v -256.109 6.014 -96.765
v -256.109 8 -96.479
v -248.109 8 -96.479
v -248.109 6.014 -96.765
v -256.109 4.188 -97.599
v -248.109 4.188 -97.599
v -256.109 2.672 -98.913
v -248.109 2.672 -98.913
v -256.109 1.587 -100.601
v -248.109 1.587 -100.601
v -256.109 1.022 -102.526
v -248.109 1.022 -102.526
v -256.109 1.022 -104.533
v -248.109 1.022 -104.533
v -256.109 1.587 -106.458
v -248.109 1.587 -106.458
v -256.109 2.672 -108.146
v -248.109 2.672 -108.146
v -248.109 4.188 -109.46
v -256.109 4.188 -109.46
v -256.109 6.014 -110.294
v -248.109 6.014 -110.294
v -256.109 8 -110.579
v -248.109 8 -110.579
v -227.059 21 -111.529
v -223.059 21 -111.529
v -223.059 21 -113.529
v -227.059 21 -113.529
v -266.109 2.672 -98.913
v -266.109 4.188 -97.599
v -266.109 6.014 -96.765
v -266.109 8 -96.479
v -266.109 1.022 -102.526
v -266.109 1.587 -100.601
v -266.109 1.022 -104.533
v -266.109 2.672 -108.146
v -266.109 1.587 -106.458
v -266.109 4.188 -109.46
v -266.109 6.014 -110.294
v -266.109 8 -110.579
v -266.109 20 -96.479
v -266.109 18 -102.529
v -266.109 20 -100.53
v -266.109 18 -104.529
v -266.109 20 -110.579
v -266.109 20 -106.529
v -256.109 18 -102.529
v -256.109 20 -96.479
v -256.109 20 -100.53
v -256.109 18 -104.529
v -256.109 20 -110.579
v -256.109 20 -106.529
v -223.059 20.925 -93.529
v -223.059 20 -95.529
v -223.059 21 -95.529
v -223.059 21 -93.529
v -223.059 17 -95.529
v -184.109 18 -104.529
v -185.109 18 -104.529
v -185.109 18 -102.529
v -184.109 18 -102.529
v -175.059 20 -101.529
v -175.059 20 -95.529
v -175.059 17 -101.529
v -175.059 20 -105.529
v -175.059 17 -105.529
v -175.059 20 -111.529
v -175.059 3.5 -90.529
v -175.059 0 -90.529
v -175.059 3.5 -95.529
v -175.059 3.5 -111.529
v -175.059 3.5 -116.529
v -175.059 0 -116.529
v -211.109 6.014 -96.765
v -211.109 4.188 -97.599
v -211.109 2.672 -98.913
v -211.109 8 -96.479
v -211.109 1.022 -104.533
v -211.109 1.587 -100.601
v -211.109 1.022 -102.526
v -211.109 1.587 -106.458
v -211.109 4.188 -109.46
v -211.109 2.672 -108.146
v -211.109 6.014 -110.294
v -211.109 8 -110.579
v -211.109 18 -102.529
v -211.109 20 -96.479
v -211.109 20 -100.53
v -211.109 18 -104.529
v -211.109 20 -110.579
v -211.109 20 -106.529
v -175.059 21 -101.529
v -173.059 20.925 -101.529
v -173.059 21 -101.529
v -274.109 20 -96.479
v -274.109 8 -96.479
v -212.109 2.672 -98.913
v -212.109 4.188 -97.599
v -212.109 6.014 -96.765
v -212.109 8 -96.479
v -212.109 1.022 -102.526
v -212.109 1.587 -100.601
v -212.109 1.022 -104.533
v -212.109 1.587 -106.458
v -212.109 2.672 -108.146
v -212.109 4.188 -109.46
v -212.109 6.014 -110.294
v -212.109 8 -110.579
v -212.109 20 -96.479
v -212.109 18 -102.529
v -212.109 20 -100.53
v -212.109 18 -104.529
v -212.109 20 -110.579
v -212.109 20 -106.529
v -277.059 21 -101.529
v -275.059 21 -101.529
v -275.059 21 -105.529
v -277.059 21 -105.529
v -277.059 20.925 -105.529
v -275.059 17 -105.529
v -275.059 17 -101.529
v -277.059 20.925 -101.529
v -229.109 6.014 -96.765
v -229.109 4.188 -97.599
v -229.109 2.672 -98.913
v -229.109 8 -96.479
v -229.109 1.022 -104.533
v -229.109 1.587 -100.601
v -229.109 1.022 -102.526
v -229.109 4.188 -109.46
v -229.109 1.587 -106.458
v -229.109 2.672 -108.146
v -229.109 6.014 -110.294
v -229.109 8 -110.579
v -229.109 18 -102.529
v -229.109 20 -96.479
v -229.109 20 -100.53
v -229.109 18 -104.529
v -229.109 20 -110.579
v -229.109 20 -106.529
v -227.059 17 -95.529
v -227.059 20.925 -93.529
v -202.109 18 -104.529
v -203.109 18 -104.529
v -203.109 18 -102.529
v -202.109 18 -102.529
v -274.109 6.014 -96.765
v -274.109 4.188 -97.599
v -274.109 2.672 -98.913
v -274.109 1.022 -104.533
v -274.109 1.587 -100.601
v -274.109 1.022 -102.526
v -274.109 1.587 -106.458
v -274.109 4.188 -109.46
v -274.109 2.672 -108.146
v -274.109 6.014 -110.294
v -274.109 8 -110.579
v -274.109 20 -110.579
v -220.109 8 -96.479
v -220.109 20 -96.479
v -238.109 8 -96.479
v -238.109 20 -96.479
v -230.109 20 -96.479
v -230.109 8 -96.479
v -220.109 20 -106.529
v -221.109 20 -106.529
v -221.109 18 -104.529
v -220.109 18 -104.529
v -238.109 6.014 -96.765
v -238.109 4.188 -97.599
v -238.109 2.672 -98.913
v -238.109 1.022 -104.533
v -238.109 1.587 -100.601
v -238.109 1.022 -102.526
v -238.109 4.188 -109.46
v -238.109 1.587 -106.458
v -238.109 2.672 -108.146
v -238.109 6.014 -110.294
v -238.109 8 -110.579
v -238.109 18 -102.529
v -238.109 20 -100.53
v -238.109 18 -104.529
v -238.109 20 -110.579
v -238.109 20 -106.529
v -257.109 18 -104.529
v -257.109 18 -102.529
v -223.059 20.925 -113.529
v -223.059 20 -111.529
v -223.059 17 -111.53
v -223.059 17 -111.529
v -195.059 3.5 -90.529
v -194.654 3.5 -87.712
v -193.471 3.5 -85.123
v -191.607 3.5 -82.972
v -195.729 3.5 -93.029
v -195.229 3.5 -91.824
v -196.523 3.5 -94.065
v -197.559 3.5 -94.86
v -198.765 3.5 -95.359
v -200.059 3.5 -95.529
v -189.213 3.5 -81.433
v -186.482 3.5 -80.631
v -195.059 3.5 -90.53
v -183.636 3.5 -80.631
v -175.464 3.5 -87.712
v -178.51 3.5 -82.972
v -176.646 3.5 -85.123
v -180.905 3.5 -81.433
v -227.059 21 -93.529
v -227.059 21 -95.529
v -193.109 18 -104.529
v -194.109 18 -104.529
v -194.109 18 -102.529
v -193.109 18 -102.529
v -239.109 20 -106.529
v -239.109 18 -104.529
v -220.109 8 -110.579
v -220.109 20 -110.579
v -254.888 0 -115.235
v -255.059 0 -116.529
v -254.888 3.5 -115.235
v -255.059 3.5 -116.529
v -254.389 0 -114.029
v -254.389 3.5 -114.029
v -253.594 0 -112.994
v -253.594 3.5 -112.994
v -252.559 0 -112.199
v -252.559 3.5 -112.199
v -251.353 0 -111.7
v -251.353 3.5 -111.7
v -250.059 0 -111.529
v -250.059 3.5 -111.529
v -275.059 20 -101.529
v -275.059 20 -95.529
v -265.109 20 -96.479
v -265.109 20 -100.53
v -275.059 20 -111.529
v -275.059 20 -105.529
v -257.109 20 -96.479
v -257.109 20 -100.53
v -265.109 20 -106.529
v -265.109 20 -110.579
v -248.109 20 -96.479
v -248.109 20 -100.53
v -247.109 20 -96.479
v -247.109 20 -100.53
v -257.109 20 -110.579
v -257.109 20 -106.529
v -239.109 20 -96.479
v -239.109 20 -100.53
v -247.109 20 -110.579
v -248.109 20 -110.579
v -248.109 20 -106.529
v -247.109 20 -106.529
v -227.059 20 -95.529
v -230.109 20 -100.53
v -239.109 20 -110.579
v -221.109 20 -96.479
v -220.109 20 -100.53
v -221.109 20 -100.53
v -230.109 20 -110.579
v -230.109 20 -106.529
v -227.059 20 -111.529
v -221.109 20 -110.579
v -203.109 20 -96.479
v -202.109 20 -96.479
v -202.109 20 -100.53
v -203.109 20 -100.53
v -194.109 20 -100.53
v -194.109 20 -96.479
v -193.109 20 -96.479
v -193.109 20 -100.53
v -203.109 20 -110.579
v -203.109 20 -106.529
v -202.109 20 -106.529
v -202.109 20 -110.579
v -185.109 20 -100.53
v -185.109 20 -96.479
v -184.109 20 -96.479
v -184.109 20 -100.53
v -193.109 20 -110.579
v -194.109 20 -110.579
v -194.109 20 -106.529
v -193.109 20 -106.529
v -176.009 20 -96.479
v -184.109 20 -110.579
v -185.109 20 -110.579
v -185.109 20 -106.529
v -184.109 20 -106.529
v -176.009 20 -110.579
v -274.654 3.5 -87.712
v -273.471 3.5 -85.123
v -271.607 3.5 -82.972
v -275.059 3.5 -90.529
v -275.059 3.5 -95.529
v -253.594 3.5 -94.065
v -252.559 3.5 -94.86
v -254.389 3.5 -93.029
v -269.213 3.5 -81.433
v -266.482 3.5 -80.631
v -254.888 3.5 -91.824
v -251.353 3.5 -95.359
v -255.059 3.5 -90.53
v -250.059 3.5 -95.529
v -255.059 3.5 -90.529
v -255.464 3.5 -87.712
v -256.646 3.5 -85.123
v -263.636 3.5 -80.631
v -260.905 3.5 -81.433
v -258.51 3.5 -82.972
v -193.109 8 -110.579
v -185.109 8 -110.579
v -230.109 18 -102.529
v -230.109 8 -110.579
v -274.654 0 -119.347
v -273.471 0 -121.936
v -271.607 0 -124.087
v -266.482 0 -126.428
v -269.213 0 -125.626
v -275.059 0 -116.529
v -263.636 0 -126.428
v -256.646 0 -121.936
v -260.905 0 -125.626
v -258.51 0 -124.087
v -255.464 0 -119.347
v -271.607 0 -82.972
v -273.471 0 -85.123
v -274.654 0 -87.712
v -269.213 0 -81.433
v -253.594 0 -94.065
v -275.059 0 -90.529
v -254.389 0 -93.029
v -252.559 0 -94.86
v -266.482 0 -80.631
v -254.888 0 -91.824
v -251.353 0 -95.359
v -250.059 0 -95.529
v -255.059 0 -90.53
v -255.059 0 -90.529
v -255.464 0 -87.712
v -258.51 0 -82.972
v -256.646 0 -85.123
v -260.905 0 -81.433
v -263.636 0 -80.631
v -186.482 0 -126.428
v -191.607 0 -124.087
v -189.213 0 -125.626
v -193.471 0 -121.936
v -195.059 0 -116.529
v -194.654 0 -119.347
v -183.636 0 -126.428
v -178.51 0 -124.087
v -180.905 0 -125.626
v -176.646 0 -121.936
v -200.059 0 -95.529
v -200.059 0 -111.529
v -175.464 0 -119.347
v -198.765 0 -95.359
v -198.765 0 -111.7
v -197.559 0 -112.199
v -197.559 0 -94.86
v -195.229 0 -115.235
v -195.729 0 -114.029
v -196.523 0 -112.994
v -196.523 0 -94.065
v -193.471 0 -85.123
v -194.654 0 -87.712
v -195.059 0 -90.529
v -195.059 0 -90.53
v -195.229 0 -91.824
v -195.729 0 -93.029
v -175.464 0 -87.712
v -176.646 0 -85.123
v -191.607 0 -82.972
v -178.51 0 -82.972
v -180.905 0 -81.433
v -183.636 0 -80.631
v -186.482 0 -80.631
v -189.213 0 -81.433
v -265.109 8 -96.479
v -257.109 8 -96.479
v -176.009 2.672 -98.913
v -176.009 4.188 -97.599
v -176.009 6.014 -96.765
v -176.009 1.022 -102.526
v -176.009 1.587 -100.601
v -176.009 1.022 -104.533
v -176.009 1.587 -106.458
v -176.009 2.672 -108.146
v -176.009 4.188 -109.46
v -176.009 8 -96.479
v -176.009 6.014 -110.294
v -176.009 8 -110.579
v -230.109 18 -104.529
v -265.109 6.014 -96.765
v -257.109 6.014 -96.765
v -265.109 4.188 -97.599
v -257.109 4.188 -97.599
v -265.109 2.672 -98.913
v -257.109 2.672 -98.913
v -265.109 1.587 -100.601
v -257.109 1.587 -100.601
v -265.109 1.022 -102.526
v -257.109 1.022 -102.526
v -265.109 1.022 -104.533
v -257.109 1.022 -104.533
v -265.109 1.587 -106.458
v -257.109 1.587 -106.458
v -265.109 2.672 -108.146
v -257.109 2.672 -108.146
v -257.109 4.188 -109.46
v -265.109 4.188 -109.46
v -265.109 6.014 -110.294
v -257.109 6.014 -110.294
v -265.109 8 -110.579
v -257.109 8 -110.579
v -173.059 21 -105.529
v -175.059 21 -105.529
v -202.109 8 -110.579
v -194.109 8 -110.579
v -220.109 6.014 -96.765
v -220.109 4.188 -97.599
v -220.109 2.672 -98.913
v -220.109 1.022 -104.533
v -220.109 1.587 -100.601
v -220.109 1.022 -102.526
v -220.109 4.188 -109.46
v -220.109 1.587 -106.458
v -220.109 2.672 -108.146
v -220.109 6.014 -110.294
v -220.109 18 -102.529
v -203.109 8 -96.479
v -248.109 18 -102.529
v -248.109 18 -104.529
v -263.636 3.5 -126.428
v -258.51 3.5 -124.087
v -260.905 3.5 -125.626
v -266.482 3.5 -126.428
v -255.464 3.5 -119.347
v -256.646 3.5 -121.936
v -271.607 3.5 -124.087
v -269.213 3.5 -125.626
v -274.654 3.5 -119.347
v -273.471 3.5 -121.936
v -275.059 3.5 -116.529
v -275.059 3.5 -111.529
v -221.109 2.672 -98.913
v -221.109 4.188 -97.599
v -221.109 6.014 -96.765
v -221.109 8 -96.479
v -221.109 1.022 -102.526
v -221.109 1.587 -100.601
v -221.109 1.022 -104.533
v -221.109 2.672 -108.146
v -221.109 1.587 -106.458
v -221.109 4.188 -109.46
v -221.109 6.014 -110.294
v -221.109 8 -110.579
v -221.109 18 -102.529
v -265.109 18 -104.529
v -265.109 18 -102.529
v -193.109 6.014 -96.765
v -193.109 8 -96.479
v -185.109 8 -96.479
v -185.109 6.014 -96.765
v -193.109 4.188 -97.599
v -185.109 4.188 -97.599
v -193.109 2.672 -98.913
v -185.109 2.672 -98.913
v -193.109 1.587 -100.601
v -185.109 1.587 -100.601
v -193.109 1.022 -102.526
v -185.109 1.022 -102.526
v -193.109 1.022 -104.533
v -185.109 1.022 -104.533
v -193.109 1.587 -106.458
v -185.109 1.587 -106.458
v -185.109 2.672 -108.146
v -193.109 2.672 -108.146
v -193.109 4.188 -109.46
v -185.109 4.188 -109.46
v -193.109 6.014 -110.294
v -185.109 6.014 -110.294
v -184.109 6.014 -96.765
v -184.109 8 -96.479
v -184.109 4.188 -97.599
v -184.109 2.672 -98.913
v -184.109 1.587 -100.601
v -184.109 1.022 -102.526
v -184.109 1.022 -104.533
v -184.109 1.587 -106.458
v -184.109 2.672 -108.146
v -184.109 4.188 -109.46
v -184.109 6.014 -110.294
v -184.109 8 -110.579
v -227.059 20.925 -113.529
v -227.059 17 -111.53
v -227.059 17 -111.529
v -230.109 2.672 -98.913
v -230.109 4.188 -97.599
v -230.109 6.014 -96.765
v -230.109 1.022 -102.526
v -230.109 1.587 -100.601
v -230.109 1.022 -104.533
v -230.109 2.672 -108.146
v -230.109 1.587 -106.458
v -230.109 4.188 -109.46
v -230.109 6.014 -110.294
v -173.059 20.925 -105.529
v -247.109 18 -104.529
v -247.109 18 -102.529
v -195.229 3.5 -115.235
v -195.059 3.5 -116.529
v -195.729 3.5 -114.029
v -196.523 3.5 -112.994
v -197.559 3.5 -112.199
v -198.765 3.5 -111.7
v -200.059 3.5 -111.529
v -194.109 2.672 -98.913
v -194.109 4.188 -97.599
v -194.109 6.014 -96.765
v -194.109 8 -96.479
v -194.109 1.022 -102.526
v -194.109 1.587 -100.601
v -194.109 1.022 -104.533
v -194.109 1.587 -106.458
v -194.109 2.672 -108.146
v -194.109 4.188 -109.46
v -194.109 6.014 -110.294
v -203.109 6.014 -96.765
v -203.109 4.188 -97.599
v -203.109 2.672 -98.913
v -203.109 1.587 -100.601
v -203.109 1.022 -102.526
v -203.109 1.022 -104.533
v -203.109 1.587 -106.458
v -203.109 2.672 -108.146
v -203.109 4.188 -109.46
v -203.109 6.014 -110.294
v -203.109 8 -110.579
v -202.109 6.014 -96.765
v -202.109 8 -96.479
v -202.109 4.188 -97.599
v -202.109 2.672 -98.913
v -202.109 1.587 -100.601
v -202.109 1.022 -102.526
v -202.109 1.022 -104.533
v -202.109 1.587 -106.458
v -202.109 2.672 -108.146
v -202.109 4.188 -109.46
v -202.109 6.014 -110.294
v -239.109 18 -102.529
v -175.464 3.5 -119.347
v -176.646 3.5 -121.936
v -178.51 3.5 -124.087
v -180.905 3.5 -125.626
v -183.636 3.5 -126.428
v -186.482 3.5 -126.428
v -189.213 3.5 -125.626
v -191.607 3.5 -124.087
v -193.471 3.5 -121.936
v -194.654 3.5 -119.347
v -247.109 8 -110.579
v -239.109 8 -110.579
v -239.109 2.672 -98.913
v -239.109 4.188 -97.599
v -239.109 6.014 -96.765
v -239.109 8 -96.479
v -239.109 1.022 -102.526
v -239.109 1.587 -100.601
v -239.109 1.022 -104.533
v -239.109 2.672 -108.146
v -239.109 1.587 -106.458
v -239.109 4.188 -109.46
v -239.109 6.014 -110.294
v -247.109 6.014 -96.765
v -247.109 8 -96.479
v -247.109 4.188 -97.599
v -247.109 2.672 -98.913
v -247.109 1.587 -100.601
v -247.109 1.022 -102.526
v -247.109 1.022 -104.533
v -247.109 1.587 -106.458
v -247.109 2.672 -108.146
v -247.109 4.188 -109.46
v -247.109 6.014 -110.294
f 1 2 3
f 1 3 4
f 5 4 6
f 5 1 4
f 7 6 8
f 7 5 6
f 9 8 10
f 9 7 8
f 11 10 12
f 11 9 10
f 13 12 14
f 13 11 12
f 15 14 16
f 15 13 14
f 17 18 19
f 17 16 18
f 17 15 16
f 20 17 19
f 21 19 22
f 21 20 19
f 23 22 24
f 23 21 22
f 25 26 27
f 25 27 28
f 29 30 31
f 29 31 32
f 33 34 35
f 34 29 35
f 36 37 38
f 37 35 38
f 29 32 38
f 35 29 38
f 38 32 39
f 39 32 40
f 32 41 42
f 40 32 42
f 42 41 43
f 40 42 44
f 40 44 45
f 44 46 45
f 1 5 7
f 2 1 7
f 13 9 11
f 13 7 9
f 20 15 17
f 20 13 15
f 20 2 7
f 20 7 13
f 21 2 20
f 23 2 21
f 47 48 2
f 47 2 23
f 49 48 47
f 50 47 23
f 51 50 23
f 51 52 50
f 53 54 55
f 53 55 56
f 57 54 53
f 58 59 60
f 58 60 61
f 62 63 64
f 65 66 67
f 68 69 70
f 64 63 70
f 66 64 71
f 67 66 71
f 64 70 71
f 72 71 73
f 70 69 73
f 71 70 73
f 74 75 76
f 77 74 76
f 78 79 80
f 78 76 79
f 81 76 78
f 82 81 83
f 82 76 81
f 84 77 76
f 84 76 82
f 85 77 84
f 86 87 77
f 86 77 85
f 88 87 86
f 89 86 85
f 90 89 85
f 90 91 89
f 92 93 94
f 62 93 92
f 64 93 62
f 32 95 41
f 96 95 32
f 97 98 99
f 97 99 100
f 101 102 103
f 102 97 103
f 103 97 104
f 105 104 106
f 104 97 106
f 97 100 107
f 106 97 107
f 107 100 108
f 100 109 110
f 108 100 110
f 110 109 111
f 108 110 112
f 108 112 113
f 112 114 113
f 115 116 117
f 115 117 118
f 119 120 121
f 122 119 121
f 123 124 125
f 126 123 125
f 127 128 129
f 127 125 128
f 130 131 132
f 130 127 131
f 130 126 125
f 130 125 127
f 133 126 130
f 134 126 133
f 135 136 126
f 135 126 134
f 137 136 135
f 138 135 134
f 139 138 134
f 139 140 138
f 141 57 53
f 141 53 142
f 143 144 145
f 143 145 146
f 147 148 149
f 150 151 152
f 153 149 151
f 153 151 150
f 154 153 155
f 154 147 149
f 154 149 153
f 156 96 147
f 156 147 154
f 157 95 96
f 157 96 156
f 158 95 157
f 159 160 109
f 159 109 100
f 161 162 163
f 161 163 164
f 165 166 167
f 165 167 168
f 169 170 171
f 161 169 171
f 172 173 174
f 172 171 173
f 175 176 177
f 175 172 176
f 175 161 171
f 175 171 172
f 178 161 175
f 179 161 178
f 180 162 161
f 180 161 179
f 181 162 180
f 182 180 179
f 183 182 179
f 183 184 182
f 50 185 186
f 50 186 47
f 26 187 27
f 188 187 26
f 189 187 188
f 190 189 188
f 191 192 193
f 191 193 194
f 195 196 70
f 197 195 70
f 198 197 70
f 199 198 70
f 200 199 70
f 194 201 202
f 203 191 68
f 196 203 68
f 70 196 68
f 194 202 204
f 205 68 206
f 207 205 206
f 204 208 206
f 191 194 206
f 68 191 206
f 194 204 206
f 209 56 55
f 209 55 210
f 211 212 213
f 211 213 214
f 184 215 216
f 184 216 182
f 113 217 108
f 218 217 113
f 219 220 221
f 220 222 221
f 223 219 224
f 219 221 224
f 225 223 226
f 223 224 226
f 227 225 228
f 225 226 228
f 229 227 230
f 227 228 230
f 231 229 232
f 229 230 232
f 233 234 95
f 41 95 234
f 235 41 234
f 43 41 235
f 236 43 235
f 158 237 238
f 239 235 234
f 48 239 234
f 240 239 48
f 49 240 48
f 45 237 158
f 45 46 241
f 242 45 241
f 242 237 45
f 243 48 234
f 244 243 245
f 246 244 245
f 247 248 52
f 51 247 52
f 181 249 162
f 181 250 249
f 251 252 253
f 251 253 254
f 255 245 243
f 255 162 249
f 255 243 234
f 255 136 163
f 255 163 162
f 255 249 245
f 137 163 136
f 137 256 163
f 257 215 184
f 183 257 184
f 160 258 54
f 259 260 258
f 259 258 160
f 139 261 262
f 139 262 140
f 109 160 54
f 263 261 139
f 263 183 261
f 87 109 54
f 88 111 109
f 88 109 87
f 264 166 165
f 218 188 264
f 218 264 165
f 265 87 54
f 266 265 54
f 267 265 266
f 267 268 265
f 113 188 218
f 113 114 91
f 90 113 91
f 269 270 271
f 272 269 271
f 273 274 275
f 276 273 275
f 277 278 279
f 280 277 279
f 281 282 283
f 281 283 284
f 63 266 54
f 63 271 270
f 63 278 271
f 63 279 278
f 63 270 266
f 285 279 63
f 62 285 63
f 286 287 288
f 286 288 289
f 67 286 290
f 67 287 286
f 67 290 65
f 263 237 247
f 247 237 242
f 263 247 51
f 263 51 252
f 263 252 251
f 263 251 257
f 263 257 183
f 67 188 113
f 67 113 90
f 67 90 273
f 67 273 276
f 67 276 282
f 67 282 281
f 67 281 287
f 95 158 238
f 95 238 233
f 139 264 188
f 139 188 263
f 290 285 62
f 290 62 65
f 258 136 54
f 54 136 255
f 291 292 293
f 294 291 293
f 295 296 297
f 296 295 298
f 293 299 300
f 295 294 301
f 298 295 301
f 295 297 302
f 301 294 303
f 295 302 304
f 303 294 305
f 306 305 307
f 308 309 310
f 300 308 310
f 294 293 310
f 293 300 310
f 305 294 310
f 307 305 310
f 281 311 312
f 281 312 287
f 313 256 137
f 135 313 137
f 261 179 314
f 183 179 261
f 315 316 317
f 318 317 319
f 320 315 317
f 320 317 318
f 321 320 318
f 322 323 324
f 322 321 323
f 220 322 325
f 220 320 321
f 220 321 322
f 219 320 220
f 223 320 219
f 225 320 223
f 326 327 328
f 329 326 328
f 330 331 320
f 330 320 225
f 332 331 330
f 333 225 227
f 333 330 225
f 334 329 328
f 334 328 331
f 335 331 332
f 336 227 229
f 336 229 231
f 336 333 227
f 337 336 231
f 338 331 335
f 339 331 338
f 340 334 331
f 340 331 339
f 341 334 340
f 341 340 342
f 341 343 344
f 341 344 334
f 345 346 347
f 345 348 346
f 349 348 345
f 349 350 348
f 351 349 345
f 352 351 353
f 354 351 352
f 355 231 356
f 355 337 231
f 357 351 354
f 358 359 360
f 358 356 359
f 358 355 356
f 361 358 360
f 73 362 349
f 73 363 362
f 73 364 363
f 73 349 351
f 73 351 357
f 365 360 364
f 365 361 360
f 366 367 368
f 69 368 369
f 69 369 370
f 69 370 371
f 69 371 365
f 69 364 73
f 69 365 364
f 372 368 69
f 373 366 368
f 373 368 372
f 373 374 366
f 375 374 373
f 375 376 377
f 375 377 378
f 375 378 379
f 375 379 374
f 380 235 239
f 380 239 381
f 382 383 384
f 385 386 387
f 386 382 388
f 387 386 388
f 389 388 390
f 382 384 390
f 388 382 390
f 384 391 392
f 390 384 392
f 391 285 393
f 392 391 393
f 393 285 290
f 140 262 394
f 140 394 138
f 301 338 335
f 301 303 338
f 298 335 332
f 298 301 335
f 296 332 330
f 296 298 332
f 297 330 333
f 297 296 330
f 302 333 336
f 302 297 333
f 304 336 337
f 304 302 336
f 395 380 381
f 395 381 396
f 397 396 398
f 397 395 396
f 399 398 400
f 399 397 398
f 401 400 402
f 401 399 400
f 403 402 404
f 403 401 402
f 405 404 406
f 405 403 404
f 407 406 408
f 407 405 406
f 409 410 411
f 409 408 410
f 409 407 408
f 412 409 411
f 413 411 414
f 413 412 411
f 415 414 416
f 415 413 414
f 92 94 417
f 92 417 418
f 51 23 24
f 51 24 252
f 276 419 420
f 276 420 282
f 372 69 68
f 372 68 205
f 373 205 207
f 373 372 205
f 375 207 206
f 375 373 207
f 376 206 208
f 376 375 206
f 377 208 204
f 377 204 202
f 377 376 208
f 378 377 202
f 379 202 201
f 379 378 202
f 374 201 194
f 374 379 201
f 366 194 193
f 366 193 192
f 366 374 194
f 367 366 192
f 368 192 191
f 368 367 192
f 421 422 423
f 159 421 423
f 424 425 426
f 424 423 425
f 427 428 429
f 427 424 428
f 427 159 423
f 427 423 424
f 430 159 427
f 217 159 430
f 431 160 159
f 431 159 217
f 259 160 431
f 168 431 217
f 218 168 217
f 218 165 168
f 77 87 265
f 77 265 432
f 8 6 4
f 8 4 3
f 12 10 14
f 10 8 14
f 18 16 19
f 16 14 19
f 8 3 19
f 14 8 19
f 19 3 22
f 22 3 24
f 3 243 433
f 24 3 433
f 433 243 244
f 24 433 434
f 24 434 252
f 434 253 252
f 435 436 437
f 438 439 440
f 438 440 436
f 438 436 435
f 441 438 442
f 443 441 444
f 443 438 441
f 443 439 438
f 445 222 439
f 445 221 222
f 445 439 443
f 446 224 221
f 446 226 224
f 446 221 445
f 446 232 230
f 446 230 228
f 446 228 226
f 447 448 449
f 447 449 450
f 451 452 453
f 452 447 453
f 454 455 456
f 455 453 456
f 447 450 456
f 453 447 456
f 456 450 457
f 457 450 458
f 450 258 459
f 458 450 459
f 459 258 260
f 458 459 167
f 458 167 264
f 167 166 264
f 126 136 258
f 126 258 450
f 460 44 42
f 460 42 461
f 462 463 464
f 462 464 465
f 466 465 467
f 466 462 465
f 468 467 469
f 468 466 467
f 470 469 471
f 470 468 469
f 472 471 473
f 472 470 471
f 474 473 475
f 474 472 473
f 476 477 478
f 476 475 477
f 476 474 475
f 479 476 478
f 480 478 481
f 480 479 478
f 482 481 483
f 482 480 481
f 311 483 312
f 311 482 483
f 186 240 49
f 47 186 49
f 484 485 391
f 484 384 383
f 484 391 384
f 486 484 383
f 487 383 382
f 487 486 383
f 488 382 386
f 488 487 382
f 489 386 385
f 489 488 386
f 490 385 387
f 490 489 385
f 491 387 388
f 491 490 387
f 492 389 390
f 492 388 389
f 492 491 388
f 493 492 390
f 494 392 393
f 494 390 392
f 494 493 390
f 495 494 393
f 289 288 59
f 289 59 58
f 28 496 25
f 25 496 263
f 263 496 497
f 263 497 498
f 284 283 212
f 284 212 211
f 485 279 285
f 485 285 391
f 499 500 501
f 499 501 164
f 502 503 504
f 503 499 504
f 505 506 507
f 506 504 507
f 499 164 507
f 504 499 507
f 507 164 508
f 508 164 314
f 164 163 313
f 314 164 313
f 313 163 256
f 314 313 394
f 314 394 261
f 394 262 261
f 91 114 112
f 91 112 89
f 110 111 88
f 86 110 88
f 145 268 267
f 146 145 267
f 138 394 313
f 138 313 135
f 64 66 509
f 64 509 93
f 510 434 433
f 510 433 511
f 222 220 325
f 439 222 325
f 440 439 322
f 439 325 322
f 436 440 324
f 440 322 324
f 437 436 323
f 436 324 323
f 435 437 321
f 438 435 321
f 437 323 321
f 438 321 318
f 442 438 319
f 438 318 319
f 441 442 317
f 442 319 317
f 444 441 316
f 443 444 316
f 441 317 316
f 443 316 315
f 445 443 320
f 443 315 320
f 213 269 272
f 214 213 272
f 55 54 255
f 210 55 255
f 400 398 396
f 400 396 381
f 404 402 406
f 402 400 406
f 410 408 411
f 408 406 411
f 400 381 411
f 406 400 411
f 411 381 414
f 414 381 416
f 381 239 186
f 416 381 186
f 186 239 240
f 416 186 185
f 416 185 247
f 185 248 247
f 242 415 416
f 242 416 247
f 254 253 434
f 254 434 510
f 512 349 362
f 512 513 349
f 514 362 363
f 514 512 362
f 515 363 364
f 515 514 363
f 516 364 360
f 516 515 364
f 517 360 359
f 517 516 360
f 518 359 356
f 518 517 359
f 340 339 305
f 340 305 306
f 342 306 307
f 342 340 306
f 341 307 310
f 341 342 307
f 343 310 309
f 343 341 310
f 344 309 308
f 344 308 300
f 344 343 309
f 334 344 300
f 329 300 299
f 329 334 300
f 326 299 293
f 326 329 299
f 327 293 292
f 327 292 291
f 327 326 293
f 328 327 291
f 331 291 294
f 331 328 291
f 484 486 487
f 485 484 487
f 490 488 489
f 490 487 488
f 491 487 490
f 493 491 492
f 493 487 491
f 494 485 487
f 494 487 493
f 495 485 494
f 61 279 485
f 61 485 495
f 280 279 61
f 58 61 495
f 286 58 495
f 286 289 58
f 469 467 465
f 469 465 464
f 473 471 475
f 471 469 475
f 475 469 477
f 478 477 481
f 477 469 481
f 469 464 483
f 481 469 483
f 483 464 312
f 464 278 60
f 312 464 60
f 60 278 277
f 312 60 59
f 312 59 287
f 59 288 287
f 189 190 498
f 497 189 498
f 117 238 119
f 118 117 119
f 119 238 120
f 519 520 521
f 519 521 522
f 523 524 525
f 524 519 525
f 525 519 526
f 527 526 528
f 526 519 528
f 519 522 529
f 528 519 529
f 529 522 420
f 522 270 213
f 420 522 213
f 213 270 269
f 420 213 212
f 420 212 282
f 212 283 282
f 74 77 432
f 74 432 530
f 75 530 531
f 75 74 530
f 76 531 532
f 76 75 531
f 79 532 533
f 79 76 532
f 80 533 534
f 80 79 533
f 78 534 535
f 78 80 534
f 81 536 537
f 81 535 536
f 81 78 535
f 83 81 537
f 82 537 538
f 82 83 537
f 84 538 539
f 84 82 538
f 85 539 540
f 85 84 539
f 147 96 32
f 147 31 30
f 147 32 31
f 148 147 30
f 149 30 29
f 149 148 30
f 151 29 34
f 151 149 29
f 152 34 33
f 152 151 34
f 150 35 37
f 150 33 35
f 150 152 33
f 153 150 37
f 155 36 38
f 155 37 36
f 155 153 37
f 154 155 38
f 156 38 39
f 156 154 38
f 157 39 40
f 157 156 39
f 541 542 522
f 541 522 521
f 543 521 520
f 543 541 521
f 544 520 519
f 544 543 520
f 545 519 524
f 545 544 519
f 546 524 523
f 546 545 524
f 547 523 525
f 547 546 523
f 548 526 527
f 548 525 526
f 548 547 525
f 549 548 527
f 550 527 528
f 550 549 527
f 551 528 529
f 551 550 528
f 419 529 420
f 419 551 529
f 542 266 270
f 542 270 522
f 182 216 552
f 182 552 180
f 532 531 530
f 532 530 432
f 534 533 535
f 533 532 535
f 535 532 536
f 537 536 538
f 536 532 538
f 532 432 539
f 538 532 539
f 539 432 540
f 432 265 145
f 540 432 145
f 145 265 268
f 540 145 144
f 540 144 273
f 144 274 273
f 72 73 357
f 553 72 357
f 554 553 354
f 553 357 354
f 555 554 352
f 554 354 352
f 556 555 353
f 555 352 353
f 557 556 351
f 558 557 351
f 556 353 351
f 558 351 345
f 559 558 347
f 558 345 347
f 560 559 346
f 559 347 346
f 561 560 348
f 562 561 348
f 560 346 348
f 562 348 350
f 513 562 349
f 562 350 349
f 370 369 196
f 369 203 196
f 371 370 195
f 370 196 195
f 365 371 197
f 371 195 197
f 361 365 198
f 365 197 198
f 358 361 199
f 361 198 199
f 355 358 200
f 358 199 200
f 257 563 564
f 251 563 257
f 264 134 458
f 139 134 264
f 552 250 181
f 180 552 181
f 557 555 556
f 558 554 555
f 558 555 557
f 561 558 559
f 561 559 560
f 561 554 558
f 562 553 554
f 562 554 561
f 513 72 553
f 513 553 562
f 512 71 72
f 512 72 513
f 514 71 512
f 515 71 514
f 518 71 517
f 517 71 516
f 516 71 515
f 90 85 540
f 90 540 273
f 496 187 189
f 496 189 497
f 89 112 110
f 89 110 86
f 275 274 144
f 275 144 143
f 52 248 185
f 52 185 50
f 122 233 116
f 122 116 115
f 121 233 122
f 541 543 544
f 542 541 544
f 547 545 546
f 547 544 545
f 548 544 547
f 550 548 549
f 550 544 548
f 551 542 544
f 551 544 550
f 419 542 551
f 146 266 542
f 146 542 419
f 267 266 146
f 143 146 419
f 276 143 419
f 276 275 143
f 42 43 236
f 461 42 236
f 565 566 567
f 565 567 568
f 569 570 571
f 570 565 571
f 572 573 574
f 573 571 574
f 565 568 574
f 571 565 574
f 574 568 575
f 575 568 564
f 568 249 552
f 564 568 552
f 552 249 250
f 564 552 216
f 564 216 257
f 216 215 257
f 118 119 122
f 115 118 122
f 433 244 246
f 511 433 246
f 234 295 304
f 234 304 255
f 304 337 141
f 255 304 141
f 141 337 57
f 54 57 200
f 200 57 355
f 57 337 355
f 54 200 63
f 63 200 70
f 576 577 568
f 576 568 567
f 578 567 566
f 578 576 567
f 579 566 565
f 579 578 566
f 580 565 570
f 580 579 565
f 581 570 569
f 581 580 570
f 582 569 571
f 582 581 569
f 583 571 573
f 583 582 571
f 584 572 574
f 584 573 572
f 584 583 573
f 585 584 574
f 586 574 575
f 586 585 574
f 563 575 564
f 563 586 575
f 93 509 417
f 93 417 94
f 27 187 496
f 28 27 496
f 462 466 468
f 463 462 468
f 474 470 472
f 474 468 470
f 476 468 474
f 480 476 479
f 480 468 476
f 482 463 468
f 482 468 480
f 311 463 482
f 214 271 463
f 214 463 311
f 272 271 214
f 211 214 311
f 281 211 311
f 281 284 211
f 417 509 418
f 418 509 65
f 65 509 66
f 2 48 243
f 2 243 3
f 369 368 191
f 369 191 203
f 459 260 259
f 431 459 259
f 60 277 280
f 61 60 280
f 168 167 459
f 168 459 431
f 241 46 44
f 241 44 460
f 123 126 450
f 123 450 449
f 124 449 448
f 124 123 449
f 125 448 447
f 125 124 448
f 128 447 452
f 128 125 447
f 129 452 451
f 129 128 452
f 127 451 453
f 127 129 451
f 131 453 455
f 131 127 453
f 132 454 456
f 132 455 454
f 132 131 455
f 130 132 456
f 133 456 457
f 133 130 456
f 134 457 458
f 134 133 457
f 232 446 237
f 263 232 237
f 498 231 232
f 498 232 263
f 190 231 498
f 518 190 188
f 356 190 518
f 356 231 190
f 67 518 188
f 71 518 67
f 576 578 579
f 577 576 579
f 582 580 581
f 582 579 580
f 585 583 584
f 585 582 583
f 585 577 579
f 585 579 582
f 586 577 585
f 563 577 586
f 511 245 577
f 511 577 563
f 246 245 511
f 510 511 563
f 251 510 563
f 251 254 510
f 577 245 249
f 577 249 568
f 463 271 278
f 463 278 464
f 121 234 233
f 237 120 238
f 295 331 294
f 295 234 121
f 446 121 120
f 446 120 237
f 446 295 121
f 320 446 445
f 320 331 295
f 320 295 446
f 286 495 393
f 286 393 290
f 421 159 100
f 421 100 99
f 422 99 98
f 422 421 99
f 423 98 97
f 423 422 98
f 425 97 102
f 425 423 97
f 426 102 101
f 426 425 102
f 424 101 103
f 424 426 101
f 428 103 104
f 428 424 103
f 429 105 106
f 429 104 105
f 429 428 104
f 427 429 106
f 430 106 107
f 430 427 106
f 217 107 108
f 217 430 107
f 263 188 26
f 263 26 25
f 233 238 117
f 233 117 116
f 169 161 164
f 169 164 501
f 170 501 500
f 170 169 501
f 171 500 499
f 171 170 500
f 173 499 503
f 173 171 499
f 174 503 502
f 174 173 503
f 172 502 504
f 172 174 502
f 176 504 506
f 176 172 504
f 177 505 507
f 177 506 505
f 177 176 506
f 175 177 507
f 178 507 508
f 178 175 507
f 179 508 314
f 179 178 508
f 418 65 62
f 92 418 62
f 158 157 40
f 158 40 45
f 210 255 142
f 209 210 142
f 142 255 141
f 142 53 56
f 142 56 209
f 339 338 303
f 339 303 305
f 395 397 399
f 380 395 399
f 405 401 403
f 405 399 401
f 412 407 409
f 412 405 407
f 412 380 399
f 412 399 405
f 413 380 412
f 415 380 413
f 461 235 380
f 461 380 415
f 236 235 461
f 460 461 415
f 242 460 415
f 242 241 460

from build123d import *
from OCP.BRepFilletAPI import BRepFilletAPI_MakeChamfer

# Parameters (mm, degrees)
SKETCH1_W           = 100
SKETCH1_H           = 16
BOSS_EXTRUDE1_DEPTH = 20
CUT_EXTRUDE2_DEPTH  = 100
SKETCH3_W           = 0.95
SKETCH3_H           = 16
BOSS_EXTRUDE2_DEPTH = 20
SKETCH4_W           = 1
SKETCH4_H           = 14.1
BOSS_EXTRUDE3_DEPTH = 20
SKETCH5_W           = 95
SKETCH5_H           = 2
CUT_EXTRUDE3_DEPTH  = 2
BOSS_EXTRUDE4_DEPTH = 3.5
FILLET1_R           = 5
FILLET2_SIZE        = 2
SKETCH9_W           = 2
SKETCH9_H           = 4
SKETCH9_W_2         = 4
SKETCH9_H_2         = 2
BOSS_EXTRUDE5_DEPTH = 4
CHAMFER1_SIZE       = 2
CHAMFER1_SIZE_2     = 3.925221011


with BuildPart() as part:
    # Sketch1 → Boss-Extrude1 (new body)
    with BuildSketch(Plane(origin=(0, 0, 0), x_dir=(1, 0, 0), z_dir=(0, 1, 0))):
        with Locations((-225.058823529, 103.529411765)):
            Rectangle(SKETCH1_W, SKETCH1_H)
    extrude(amount=BOSS_EXTRUDE1_DEPTH)

    # Sketch2 → Cut-Extrude2 (cut)
    with BuildSketch(Plane.ZY.offset(275.058823529)):
        with BuildLine():
            Line((-110.579411765, 20), (-96.479411765, 20))
            Line((-96.479411765, 20), (-96.479411765, 8))
            ThreePointArc((-96.479411765, 8), (-103.529411765, 0.95), (-110.579411765, 8))
            Line((-110.579411765, 8), (-110.579411765, 20))
        make_face()
    extrude(amount=-CUT_EXTRUDE2_DEPTH, mode=Mode.SUBTRACT)

    # Sketch3 → Boss-Extrude2 (add)
    with BuildSketch(Plane(origin=(0, 20, 0), x_dir=(1, 0, 0), z_dir=(0, 1, 0))):
        with Locations((-175.533823529, 103.529411765)):
            Rectangle(SKETCH3_W, SKETCH3_H)
        with Locations((-274.583823529, 103.529411765)):
            Rectangle(SKETCH3_W, SKETCH3_H)
    extrude(amount=-BOSS_EXTRUDE2_DEPTH)

    # Sketch4 → Boss-Extrude3 (add)
    with BuildSketch(Plane(origin=(0, 20, 0), x_dir=(1, 0, 0), z_dir=(0, 1, 0))):
        with Locations((-265.608823529, 103.529411765)):
            Rectangle(SKETCH4_W, SKETCH4_H)
        with Locations((-256.608823529, 103.529411765)):
            Rectangle(SKETCH4_W, SKETCH4_H)
        with Locations((-247.608823529, 103.529411765)):
            Rectangle(SKETCH4_W, SKETCH4_H)
        with Locations((-238.608823529, 103.529411765)):
            Rectangle(SKETCH4_W, SKETCH4_H)
        with Locations((-229.608823529, 103.529411765)):
            Rectangle(SKETCH4_W, SKETCH4_H)
        with Locations((-220.608823529, 103.529411765)):
            Rectangle(SKETCH4_W, SKETCH4_H)
        with Locations((-211.608823529, 103.529411765)):
            Rectangle(SKETCH4_W, SKETCH4_H)
        with Locations((-202.608823529, 103.529411765)):
            Rectangle(SKETCH4_W, SKETCH4_H)
        with Locations((-193.608823529, 103.529411765)):
            Rectangle(SKETCH4_W, SKETCH4_H)
        with Locations((-184.608823529, 103.529411765)):
            Rectangle(SKETCH4_W, SKETCH4_H)
    extrude(amount=-BOSS_EXTRUDE3_DEPTH)

    # Sketch5 → Cut-Extrude3 (cut)
    with BuildSketch(Plane(origin=(0, 20, 0), x_dir=(1, 0, 0), z_dir=(0, 1, 0))):
        with Locations((-225.058823529, 103.529411765)):
            Rectangle(SKETCH5_W, SKETCH5_H)
    extrude(amount=-CUT_EXTRUDE3_DEPTH, mode=Mode.SUBTRACT)

    # Sketch6 → Boss-Extrude4 (add)
    with BuildSketch(Plane.XZ):
        with BuildLine():
            Line((-275.058823529, -90.529411765), (-275.058823529, -95.529411765))
            Line((-275.058823529, -95.529411765), (-255.058823529, -95.529411765))
            Line((-255.058823529, -95.529411765), (-255.058823529, -90.529411765))
            ThreePointArc((-255.058823529, -90.529411765), (-265.058823529, -80.529411765), (-275.058823529, -90.529411765))
        make_face()
        with BuildLine():
            Line((-175.058823529, -111.529411765), (-175.058823529, -116.529411765))
            ThreePointArc((-175.058823529, -116.529411765), (-185.058823529, -126.529411765), (-195.058823529, -116.529411765))
            Line((-195.058823529, -116.529411765), (-195.058823529, -111.529411765))
            Line((-195.058823529, -111.529411765), (-175.058823529, -111.529411765))
        make_face()
        with BuildLine():
            Line((-195.058823529, -90.529411765), (-195.058823529, -95.529411765))
            Line((-195.058823529, -95.529411765), (-175.058823529, -95.529411765))
            Line((-175.058823529, -95.529411765), (-175.058823529, -90.529411765))
            ThreePointArc((-175.058823529, -90.529411765), (-185.058823529, -80.529411765), (-195.058823529, -90.529411765))
        make_face()
        with BuildLine():
            Line((-275.058823529, -111.529411765), (-255.058823529, -111.529411765))
            Line((-255.058823529, -111.529411765), (-255.058823529, -116.529411765))
            ThreePointArc((-255.058823529, -116.529411765), (-265.058823529, -126.529411765), (-275.058823529, -116.529411765))
            Line((-275.058823529, -116.529411765), (-275.058823529, -111.529411765))
        make_face()
    extrude(amount=-BOSS_EXTRUDE4_DEPTH)

    # Fillet1
    fillet1_edges = [part.edges().sort_by_distance(p)[0] for p in [
        (-195.058823529, 1.75, -95.529411765),
        (-255.058823529, 1.75, -95.529411765),
        (-255.058823529, 1.75, -111.529411765),
        (-195.058823529, 1.75, -111.529411765),
    ]]
    fillet(fillet1_edges, radius=FILLET1_R - 0.0001)  # a hair under: the kernel refuses the full size

    # Fillet2
    fillet2_edges = [part.edges().sort_by_distance(p)[0] for p in [
        (-238.608823529, 20, -102.529411765),
        (-238.608823529, 20, -104.529411765),
        (-202.608823529, 20, -102.529411765),
        (-202.608823529, 20, -104.529411765),
        (-184.608823529, 20, -102.529411765),
        (-184.608823529, 20, -104.529411765),
        (-193.608823529, 20, -102.529411765),
        (-193.608823529, 20, -104.529411765),
        (-211.608823529, 20, -104.529411765),
        (-211.608823529, 20, -102.529411765),
        (-220.608823529, 20, -102.529411765),
        (-220.608823529, 20, -104.529411765),
        (-229.608823529, 20, -102.529411765),
        (-229.608823529, 20, -104.529411765),
        (-247.608823529, 20, -104.529411765),
        (-247.608823529, 20, -102.529411765),
        (-256.608823529, 20, -104.529411765),
        (-256.608823529, 20, -102.529411765),
        (-265.608823529, 20, -104.529411765),
        (-265.608823529, 20, -102.529411765),
    ]]
    chamfer(fillet2_edges, length=FILLET2_SIZE - 0.0001)  # a hair under: the kernel refuses the full size

    # Sketch9 → Boss-Extrude5 (add)
    with BuildSketch(Plane(origin=(0, 17, 0), x_dir=(-1, 0, 0), z_dir=(0, 1, 0))):
        with Locations((174.058823529, -103.529411765)):
            Rectangle(SKETCH9_W, SKETCH9_H)
        with Locations((276.058823529, -103.529411765)):
            Rectangle(SKETCH9_W, SKETCH9_H)
        with Locations((225.058823529, -112.529411765)):
            Rectangle(SKETCH9_W_2, SKETCH9_H_2)
        with Locations((225.058823529, -94.529411765)):
            Rectangle(SKETCH9_W_2, SKETCH9_H_2)
    extrude(amount=BOSS_EXTRUDE5_DEPTH)

    # Chamfer1
    chamfer1_edges_1 = [part.edges().sort_by_distance(p)[0] for p in [
        (-225.058823529, 17, -113.529411765),
    ]]
    chamfer1_side_1 = [part.faces().sort_by_distance(p)[0] for p in [
        (-225.058823529, 17, -113.489411765),
    ]]
    chamfer1_edges_2 = [part.edges().sort_by_distance(p)[0] for p in [
        (-173.058823529, 17, -103.529411765),
    ]]
    chamfer1_side_2 = [part.faces().sort_by_distance(p)[0] for p in [
        (-173.098823529, 17, -103.529411765),
    ]]
    chamfer1_edges_3 = [part.edges().sort_by_distance(p)[0] for p in [
        (-225.058823529, 17, -93.529411765),
    ]]
    chamfer1_side_3 = [part.faces().sort_by_distance(p)[0] for p in [
        (-225.058823529, 17, -93.569411765),
    ]]
    chamfer1_edges_4 = [part.edges().sort_by_distance(p)[0] for p in [
        (-277.058823529, 17, -103.529411765),
    ]]
    chamfer1_side_4 = [part.faces().sort_by_distance(p)[0] for p in [
        (-277.018823529, 17, -103.529411765),
    ]]
    chamfer1 = BRepFilletAPI_MakeChamfer(part.part.solid().wrapped)
    for e in chamfer1_edges_1:
        chamfer1.Add(CHAMFER1_SIZE - 0.0001, CHAMFER1_SIZE_2 - 0.0001, e.wrapped, chamfer1_side_1[0].wrapped)
    for e in chamfer1_edges_2:
        chamfer1.Add(CHAMFER1_SIZE - 0.0001, CHAMFER1_SIZE_2 - 0.0001, e.wrapped, chamfer1_side_2[0].wrapped)
    for e in chamfer1_edges_3:
        chamfer1.Add(CHAMFER1_SIZE - 0.0001, CHAMFER1_SIZE_2 - 0.0001, e.wrapped, chamfer1_side_3[0].wrapped)
    for e in chamfer1_edges_4:
        chamfer1.Add(CHAMFER1_SIZE - 0.0001, CHAMFER1_SIZE_2 - 0.0001, e.wrapped, chamfer1_side_4[0].wrapped)
    add(Compound.cast(chamfer1.Shape()), mode=Mode.REPLACE)  # a hair under: the kernel refuses the full size


solid = part.part
